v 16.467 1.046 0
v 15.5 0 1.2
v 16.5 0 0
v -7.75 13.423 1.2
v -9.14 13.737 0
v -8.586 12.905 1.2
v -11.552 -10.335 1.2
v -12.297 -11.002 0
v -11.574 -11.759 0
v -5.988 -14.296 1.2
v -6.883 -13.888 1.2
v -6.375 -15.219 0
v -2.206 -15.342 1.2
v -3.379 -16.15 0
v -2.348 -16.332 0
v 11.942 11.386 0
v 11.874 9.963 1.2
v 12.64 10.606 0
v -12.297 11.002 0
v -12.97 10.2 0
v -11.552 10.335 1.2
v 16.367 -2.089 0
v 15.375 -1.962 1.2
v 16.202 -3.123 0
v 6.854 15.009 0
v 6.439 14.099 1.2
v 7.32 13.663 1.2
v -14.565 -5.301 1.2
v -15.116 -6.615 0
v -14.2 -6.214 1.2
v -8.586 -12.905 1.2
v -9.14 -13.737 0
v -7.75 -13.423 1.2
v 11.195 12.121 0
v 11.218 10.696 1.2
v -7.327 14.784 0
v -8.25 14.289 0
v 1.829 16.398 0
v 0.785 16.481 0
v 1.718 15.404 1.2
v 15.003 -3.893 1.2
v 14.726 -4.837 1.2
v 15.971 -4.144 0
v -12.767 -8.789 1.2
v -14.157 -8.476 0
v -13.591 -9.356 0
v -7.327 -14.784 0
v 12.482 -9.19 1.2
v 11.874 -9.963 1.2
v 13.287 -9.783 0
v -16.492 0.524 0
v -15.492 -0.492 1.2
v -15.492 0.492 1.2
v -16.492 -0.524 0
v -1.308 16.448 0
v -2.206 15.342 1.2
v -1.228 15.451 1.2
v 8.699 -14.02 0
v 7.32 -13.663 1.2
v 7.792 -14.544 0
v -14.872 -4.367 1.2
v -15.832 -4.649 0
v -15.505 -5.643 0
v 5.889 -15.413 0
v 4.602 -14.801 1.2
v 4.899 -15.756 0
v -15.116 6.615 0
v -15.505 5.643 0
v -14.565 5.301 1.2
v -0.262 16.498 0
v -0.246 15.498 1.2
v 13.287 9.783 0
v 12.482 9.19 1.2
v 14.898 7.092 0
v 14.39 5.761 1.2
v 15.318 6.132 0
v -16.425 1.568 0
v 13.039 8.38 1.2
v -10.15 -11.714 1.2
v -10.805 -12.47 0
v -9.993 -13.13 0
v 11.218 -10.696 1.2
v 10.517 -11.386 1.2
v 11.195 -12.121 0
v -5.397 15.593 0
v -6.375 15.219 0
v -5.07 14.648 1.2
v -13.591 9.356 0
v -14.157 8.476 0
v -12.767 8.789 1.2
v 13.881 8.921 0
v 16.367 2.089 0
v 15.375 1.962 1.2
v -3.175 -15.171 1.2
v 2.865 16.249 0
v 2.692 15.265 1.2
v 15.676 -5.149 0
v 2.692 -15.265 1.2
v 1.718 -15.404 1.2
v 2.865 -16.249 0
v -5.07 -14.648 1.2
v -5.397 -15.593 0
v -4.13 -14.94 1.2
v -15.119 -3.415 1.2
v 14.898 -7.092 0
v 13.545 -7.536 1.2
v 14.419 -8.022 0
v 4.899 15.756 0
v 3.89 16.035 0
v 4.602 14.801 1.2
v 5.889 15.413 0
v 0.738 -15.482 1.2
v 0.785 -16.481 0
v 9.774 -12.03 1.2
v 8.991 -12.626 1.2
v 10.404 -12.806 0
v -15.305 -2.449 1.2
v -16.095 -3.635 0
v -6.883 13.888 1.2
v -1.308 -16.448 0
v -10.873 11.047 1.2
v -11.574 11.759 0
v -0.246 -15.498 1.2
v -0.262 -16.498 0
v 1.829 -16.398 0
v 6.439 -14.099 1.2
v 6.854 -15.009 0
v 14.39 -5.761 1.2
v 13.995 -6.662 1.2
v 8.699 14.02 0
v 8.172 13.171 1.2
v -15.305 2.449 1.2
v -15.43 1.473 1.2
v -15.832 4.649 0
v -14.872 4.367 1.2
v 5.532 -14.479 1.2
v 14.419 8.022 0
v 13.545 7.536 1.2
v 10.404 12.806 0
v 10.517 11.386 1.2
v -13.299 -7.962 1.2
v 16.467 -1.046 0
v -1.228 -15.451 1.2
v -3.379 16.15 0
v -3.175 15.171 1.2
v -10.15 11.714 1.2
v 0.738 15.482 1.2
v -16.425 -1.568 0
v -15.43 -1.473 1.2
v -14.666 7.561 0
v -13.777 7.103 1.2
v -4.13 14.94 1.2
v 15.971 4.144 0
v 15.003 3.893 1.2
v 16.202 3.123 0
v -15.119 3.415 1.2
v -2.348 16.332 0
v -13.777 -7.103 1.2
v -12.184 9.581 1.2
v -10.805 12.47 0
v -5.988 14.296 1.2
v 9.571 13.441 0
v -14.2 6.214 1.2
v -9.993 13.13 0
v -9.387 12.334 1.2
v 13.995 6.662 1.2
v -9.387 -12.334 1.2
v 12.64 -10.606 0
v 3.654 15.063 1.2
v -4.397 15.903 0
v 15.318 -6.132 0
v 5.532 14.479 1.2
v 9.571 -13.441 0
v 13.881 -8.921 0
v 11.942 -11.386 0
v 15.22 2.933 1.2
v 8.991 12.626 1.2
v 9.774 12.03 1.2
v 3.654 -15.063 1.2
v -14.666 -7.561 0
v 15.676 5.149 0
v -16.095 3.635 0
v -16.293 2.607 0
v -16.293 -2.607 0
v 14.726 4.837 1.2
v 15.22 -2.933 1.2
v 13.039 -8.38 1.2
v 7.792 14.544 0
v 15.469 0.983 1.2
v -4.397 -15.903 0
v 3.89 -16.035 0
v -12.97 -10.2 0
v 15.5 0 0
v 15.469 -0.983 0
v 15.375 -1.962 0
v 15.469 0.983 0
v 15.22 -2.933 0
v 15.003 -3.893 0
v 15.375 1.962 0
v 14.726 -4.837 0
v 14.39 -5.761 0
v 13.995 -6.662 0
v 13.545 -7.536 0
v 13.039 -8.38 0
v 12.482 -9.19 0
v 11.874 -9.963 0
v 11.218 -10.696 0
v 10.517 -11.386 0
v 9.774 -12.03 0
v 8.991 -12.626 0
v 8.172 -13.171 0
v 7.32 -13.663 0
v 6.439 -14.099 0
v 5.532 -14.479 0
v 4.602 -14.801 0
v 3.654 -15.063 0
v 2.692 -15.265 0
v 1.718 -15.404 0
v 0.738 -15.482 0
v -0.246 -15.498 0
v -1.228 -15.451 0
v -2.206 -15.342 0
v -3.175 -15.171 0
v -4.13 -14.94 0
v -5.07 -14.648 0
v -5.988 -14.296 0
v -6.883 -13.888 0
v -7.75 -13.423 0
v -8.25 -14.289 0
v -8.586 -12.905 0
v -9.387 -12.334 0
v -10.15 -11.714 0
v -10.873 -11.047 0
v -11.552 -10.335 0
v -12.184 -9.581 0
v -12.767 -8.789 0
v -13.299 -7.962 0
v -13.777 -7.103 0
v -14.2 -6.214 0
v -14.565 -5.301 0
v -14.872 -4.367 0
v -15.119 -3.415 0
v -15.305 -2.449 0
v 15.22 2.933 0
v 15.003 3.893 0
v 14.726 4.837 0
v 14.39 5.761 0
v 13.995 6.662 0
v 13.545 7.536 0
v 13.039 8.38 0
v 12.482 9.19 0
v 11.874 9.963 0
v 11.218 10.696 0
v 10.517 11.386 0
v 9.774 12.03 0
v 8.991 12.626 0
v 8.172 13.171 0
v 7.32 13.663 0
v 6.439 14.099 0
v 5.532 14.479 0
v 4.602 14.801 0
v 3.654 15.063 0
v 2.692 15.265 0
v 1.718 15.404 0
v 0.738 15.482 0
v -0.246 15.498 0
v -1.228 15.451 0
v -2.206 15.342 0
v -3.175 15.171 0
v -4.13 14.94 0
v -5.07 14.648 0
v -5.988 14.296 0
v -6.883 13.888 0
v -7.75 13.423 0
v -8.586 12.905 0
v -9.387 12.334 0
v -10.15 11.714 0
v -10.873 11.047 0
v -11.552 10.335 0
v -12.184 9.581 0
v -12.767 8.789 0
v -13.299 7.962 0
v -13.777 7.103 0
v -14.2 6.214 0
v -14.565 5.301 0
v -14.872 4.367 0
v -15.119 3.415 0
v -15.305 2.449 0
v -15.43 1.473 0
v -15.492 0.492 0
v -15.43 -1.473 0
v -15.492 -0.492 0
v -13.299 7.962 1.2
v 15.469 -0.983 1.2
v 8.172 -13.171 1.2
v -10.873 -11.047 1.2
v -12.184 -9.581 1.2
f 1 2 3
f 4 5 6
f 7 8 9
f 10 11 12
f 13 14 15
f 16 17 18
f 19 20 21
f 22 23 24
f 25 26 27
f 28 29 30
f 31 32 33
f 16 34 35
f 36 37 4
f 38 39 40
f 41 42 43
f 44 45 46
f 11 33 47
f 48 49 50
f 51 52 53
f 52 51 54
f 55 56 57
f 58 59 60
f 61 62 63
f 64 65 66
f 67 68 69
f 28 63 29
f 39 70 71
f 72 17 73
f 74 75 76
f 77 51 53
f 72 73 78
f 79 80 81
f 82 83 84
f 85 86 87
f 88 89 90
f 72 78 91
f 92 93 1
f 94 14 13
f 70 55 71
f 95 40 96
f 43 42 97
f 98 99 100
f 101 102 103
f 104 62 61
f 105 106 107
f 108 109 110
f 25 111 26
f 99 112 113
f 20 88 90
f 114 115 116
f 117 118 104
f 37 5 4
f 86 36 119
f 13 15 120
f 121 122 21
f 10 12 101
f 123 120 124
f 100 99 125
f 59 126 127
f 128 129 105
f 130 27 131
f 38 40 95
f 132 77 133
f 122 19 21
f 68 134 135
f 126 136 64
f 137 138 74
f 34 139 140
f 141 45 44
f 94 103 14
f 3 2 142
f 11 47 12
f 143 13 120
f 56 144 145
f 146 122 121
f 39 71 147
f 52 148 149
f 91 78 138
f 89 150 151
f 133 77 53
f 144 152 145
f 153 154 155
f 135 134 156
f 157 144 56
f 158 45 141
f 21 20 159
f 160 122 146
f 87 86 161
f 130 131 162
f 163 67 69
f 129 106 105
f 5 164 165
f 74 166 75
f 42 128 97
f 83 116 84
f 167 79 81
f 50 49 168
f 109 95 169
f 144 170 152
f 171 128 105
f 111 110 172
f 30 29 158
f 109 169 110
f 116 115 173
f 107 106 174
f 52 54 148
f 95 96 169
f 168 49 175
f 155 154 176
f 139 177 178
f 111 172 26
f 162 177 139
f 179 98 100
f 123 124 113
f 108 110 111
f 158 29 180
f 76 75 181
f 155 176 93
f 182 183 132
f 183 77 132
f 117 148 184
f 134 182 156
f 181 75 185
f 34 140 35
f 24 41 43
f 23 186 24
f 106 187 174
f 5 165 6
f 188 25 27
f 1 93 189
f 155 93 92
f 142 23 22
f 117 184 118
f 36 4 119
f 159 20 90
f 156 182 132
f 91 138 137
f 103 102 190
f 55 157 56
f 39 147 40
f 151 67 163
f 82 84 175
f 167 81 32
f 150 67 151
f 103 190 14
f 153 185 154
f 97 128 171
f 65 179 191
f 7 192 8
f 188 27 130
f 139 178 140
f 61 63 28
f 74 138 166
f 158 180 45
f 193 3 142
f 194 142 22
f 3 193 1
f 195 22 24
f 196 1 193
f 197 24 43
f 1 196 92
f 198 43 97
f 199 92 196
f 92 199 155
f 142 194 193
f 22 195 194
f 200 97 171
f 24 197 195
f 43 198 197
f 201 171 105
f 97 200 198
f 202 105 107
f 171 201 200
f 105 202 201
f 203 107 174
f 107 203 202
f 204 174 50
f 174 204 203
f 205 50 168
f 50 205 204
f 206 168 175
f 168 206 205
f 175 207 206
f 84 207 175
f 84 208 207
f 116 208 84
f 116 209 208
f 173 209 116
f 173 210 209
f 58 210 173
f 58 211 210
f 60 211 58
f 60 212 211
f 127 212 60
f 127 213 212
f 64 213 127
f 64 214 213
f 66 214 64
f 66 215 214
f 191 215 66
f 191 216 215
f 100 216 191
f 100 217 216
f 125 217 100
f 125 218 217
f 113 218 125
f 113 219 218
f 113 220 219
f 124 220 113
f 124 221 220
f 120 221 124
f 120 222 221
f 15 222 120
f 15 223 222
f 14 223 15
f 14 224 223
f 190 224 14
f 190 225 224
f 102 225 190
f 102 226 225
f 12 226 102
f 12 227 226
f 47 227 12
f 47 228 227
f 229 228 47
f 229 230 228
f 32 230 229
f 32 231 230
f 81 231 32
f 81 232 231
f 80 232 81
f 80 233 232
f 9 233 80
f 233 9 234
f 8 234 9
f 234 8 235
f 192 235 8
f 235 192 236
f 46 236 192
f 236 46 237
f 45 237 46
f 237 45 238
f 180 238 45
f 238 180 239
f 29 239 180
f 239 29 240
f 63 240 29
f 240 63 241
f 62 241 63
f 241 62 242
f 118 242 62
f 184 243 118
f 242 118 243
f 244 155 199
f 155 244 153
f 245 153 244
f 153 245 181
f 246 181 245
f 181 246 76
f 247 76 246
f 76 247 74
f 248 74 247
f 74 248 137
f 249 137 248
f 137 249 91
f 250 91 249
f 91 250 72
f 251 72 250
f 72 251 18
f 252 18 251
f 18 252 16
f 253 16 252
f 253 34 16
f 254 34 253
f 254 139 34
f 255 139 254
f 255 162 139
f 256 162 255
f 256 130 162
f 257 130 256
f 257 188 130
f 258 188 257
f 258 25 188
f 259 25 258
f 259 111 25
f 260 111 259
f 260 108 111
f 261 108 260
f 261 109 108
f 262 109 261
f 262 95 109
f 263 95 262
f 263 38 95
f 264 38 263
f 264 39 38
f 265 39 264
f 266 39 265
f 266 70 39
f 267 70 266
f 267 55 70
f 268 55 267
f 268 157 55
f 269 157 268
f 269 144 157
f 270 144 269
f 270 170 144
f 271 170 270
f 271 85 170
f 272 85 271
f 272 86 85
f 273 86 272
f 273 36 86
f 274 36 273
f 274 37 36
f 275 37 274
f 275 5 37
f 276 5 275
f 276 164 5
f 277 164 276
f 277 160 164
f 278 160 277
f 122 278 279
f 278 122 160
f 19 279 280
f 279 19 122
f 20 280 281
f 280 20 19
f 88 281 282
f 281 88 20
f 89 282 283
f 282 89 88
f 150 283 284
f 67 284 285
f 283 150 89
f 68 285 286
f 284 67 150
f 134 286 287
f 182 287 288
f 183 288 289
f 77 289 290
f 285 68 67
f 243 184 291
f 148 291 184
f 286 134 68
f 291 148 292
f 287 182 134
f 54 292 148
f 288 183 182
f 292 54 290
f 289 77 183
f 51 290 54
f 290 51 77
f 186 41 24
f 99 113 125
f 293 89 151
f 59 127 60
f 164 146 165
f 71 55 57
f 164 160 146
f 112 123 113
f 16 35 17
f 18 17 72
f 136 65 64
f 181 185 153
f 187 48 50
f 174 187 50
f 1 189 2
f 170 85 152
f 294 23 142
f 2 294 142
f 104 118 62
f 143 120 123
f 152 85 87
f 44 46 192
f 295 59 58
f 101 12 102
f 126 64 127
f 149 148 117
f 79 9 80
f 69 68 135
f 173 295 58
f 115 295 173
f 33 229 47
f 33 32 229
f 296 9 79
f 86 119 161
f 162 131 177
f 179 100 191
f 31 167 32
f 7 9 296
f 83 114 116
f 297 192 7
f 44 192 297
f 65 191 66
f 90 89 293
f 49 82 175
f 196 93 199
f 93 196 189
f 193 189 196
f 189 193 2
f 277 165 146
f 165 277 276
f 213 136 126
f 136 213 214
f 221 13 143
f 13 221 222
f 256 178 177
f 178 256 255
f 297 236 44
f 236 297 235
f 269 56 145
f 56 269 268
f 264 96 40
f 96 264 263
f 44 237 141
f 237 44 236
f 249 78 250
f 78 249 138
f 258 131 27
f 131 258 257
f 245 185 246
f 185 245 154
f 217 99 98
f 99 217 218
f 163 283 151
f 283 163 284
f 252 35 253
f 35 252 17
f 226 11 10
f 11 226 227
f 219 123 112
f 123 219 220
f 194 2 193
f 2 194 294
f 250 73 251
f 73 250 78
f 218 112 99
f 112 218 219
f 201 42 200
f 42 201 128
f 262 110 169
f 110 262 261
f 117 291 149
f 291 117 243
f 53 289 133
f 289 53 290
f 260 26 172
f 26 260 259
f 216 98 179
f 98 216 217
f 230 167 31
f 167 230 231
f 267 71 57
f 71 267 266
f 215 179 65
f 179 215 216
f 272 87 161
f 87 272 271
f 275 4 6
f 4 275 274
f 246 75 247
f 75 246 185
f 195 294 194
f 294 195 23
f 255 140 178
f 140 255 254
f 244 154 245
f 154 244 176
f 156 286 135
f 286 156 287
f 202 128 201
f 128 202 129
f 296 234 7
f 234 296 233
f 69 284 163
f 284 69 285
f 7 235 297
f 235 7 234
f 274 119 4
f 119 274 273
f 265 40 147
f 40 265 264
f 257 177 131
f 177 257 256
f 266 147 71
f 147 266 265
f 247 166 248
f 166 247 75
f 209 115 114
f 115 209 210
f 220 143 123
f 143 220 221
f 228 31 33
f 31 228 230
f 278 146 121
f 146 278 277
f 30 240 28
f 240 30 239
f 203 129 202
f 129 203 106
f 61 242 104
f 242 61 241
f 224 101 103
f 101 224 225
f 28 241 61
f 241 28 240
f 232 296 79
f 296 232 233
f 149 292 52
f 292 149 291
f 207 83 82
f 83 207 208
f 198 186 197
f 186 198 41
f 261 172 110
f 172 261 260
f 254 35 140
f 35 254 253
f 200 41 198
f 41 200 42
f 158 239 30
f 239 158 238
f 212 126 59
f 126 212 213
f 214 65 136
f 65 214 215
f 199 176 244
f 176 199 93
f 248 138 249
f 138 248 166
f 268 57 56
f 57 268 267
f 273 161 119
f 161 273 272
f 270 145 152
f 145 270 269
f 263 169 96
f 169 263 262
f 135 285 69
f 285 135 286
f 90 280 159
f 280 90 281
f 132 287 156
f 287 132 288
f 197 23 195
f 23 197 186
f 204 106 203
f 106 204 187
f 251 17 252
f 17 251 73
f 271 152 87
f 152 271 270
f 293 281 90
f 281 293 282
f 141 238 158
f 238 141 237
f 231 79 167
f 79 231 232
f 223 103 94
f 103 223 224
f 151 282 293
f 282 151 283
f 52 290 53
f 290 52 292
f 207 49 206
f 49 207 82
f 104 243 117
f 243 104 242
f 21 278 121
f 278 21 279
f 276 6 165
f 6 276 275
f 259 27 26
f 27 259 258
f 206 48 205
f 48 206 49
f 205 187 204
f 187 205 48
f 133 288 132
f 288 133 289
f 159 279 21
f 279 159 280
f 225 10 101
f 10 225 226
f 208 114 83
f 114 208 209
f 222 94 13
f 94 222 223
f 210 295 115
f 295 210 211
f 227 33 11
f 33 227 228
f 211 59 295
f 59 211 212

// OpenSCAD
// file: rounder.scad
// rounder.scad
// cutting tool for rounding off corners with a cylinder

//---------------------
module rounder(
r=10,   // radius
h=10,   // height
f=22,    // $fn
extra=0.01  // extra size for the cube
){

difference(){
  translate([-extra,-extra,-extra])
  cube([r+extra,r+extra,h+2*extra]);
  translate([r,r,-1])
  cylinder(r=r,h=h+2,$fn=f);
}

}

//---------------------------------------------------------------------------
module bevel(x=1,y=1,h=10){

linear_extrude(height=h)
polygon(points=[[0,0],[x,0],[0,y]]);
    
}
  

//========================

rounder();

//========================
// main file
//=================================================================================
// PonyEyes.scad
//
// Replacement for glass eyes on pony gloves
//
// Dr Tom Flint, 18 Feb 2023
//=================================================================================


use <../Parts/rounder.scad>

f1=99;
split=9;

//---------------------------------------------------------------------------------
module eye(){

  difference(){  
    cylinder(r=31/2,h=1.2,$fn=f1);
    
    intersection(){
      translate([split,0,0])
      cylinder(r=30/2,h=2,$fn=f1);
      translate([-split,0,0])
      cylinder(r=30/2,h=2,$fn=f1);
    }
  }
}

//---------------------------------------------------------------------------------
module pupil(){
  intersection(){
    translate([split,0,0])
    cylinder(r=30/2,h=0.9,$fn=f1);
    translate([-split,0,0])
    cylinder(r=30/2,h=0.9,$fn=f1);
  }
}

//---------------------------------------------------------------------------------
module rim(){
  difference(){  
    cylinder(r1=33/2,r2=31/2,h=1.2,$fn=f1);
    translate([0,0,-0.1])
    cylinder(r=31/2,h=1.5,$fn=f1);
  }
}
//=================================================================================

//eye();
//pupil();
rim();

//=================================================================================
